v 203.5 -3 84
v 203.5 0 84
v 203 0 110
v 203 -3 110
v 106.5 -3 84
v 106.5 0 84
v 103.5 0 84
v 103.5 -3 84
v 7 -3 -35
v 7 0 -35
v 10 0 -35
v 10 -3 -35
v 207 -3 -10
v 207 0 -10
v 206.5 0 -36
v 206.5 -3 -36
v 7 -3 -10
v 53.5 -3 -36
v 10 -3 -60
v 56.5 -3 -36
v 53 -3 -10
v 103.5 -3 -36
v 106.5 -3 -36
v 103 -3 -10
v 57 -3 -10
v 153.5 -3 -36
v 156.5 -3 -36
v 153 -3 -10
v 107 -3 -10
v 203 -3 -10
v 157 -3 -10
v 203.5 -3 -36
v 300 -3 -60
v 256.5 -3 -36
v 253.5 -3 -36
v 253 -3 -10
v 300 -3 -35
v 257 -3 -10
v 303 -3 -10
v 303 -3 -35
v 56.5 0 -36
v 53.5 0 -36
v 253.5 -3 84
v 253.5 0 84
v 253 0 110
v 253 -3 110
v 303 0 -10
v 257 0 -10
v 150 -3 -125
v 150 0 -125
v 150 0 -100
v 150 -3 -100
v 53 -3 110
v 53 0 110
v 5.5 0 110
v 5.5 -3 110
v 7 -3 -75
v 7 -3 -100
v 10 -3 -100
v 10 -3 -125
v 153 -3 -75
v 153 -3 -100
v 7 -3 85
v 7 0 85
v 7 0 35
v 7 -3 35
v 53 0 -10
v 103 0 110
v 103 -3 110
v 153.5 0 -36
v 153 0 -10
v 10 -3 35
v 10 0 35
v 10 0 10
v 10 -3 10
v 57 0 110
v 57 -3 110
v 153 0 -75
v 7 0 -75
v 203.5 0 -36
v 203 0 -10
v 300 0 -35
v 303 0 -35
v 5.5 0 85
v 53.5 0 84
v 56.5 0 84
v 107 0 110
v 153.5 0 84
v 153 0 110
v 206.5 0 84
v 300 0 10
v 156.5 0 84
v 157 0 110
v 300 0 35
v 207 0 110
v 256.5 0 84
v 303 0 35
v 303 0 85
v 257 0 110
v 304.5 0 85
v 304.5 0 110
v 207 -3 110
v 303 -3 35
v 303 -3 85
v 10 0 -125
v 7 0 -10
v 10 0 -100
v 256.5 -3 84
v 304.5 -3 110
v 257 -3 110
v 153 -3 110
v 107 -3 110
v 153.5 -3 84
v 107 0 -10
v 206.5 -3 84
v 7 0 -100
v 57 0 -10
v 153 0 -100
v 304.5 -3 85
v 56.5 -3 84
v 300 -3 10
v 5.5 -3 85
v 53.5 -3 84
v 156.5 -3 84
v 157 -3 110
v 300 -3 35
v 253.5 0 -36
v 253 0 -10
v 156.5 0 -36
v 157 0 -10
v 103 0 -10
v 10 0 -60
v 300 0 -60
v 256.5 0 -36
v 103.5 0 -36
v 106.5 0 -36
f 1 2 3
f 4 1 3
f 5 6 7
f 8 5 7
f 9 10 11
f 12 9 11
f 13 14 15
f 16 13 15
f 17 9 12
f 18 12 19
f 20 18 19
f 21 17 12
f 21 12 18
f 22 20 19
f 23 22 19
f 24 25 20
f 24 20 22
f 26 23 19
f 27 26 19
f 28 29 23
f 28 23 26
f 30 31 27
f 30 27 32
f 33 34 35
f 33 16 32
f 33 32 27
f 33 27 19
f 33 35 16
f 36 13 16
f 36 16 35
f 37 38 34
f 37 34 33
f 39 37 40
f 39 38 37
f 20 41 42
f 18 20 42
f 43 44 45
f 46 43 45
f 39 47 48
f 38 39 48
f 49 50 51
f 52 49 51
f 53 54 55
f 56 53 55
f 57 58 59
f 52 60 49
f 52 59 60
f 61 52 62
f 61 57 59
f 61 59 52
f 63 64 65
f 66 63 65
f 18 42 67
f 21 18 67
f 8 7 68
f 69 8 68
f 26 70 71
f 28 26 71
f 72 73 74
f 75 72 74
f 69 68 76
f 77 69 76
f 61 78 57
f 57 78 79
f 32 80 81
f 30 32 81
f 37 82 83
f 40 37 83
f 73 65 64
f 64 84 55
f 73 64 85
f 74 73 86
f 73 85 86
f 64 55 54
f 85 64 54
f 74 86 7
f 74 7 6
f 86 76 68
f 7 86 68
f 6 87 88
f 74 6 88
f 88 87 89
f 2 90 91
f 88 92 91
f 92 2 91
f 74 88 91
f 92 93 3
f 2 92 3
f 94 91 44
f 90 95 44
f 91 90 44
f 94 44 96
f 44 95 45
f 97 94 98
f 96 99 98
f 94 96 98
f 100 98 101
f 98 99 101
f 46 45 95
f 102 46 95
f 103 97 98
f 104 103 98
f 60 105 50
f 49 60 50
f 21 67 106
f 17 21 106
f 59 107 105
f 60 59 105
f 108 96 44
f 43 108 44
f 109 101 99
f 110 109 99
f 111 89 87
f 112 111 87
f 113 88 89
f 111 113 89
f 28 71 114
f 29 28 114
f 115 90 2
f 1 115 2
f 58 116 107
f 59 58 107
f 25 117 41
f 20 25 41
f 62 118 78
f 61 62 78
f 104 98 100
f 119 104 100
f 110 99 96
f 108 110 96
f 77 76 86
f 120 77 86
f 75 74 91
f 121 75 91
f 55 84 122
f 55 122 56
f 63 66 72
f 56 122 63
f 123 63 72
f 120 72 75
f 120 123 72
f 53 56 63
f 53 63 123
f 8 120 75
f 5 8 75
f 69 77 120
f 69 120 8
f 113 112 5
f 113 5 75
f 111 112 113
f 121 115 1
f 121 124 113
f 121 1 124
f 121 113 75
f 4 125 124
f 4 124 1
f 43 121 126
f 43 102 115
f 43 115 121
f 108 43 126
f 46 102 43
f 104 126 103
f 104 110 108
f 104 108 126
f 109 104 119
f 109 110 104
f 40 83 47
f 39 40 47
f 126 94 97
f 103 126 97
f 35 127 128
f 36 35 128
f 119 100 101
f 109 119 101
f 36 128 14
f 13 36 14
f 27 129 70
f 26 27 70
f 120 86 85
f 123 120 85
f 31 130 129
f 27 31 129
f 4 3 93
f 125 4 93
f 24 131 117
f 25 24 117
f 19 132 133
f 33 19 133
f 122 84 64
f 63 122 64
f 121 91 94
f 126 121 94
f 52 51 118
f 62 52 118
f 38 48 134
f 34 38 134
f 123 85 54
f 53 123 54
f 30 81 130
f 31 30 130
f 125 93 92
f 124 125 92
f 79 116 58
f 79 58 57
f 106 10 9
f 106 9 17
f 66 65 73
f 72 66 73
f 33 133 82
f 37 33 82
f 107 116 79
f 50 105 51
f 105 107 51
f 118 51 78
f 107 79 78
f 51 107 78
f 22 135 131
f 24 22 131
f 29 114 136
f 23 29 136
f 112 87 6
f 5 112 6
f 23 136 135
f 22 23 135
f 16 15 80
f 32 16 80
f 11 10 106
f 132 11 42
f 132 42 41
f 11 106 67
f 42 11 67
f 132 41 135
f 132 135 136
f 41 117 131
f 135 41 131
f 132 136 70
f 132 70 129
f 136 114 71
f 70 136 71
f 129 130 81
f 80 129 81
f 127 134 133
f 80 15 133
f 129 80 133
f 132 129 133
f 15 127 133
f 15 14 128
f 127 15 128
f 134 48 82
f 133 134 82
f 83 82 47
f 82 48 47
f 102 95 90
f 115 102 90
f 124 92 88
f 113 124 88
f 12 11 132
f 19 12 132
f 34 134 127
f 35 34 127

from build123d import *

# Parameters (mm, degrees)
F0_W     = 1.5
F0_H     = 25
F0_W_2   = 3
F1_DEPTH = 3
F2_W     = 3
F2_H     = 25
F3_DEPTH = 3
F4_W     = 3
F4_H     = 25
F5_DEPTH = 3


with BuildPart() as f1:
    # F0 (on Front) → F1 (new body)
    with BuildSketch(Plane.XZ):
        Polygon((10, 35), (10, 10), (300, 10), (300, 35), (300, 60), (300, 110), (257, 110), (256.5, 84), (253.5, 84), (253, 110), (207, 110), (206.5, 84), (203.5, 84), (203, 110), (157, 110), (156.5, 84), (153.5, 84), (153, 110), (107, 110), (106.5, 84), (103.5, 84), (103, 110), (57, 110), (56.5, 84), (53.5, 84), (53, 110), (10, 110), (10, 60), align=None)
        Polygon((7, 60), (10, 60), (10, 110), (7, 110), (7, 85), align=None)
        with Locations((6.25, 97.5)):
            Rectangle(F0_W, F0_H)
        with Locations((8.5, 47.5)):
            Rectangle(F0_W_2, F0_H)
        with Locations((301.5, 47.5)):
            Rectangle(F0_W_2, F0_H)
        Polygon((300, 110), (300, 60), (303, 60), (303, 85), (303, 110), align=None)
        with Locations((303.75, 97.5)):
            Rectangle(F0_W, F0_H)
    extrude(amount=F1_DEPTH)


with BuildPart() as f3:
    # F2 (on Front) → F3 (new body)
    with BuildSketch(Plane.XZ):
        Polygon((10, -35), (10, -60), (300, -60), (300, -35), (300, -10), (257, -10), (256.5, -36), (253.5, -36), (253, -10), (207, -10), (206.5, -36), (203.5, -36), (203, -10), (157, -10), (156.5, -36), (153.5, -36), (153, -10), (107, -10), (106.5, -36), (103.5, -36), (103, -10), (57, -10), (56.5, -36), (53.5, -36), (53, -10), (10, -10), align=None)
        with Locations((8.5, -22.5)):
            Rectangle(F2_W, F2_H)
        with Locations((301.5, -22.5)):
            Rectangle(F2_W, F2_H)
    extrude(amount=F3_DEPTH)


with BuildPart() as f5:
    # F4 (on Front) → F5 (new body)
    with BuildSketch(Plane.XZ):
        Polygon((10, -100), (10, -125), (150, -125), (150, -100), (150, -75), (10, -75), align=None)
        with Locations((151.5, -87.5)):
            Rectangle(F4_W, F4_H)
        with Locations((8.5, -87.5)):
            Rectangle(F4_W, F4_H)
    extrude(amount=F5_DEPTH)


solid = Compound([f1.part, f3.part, f5.part])
